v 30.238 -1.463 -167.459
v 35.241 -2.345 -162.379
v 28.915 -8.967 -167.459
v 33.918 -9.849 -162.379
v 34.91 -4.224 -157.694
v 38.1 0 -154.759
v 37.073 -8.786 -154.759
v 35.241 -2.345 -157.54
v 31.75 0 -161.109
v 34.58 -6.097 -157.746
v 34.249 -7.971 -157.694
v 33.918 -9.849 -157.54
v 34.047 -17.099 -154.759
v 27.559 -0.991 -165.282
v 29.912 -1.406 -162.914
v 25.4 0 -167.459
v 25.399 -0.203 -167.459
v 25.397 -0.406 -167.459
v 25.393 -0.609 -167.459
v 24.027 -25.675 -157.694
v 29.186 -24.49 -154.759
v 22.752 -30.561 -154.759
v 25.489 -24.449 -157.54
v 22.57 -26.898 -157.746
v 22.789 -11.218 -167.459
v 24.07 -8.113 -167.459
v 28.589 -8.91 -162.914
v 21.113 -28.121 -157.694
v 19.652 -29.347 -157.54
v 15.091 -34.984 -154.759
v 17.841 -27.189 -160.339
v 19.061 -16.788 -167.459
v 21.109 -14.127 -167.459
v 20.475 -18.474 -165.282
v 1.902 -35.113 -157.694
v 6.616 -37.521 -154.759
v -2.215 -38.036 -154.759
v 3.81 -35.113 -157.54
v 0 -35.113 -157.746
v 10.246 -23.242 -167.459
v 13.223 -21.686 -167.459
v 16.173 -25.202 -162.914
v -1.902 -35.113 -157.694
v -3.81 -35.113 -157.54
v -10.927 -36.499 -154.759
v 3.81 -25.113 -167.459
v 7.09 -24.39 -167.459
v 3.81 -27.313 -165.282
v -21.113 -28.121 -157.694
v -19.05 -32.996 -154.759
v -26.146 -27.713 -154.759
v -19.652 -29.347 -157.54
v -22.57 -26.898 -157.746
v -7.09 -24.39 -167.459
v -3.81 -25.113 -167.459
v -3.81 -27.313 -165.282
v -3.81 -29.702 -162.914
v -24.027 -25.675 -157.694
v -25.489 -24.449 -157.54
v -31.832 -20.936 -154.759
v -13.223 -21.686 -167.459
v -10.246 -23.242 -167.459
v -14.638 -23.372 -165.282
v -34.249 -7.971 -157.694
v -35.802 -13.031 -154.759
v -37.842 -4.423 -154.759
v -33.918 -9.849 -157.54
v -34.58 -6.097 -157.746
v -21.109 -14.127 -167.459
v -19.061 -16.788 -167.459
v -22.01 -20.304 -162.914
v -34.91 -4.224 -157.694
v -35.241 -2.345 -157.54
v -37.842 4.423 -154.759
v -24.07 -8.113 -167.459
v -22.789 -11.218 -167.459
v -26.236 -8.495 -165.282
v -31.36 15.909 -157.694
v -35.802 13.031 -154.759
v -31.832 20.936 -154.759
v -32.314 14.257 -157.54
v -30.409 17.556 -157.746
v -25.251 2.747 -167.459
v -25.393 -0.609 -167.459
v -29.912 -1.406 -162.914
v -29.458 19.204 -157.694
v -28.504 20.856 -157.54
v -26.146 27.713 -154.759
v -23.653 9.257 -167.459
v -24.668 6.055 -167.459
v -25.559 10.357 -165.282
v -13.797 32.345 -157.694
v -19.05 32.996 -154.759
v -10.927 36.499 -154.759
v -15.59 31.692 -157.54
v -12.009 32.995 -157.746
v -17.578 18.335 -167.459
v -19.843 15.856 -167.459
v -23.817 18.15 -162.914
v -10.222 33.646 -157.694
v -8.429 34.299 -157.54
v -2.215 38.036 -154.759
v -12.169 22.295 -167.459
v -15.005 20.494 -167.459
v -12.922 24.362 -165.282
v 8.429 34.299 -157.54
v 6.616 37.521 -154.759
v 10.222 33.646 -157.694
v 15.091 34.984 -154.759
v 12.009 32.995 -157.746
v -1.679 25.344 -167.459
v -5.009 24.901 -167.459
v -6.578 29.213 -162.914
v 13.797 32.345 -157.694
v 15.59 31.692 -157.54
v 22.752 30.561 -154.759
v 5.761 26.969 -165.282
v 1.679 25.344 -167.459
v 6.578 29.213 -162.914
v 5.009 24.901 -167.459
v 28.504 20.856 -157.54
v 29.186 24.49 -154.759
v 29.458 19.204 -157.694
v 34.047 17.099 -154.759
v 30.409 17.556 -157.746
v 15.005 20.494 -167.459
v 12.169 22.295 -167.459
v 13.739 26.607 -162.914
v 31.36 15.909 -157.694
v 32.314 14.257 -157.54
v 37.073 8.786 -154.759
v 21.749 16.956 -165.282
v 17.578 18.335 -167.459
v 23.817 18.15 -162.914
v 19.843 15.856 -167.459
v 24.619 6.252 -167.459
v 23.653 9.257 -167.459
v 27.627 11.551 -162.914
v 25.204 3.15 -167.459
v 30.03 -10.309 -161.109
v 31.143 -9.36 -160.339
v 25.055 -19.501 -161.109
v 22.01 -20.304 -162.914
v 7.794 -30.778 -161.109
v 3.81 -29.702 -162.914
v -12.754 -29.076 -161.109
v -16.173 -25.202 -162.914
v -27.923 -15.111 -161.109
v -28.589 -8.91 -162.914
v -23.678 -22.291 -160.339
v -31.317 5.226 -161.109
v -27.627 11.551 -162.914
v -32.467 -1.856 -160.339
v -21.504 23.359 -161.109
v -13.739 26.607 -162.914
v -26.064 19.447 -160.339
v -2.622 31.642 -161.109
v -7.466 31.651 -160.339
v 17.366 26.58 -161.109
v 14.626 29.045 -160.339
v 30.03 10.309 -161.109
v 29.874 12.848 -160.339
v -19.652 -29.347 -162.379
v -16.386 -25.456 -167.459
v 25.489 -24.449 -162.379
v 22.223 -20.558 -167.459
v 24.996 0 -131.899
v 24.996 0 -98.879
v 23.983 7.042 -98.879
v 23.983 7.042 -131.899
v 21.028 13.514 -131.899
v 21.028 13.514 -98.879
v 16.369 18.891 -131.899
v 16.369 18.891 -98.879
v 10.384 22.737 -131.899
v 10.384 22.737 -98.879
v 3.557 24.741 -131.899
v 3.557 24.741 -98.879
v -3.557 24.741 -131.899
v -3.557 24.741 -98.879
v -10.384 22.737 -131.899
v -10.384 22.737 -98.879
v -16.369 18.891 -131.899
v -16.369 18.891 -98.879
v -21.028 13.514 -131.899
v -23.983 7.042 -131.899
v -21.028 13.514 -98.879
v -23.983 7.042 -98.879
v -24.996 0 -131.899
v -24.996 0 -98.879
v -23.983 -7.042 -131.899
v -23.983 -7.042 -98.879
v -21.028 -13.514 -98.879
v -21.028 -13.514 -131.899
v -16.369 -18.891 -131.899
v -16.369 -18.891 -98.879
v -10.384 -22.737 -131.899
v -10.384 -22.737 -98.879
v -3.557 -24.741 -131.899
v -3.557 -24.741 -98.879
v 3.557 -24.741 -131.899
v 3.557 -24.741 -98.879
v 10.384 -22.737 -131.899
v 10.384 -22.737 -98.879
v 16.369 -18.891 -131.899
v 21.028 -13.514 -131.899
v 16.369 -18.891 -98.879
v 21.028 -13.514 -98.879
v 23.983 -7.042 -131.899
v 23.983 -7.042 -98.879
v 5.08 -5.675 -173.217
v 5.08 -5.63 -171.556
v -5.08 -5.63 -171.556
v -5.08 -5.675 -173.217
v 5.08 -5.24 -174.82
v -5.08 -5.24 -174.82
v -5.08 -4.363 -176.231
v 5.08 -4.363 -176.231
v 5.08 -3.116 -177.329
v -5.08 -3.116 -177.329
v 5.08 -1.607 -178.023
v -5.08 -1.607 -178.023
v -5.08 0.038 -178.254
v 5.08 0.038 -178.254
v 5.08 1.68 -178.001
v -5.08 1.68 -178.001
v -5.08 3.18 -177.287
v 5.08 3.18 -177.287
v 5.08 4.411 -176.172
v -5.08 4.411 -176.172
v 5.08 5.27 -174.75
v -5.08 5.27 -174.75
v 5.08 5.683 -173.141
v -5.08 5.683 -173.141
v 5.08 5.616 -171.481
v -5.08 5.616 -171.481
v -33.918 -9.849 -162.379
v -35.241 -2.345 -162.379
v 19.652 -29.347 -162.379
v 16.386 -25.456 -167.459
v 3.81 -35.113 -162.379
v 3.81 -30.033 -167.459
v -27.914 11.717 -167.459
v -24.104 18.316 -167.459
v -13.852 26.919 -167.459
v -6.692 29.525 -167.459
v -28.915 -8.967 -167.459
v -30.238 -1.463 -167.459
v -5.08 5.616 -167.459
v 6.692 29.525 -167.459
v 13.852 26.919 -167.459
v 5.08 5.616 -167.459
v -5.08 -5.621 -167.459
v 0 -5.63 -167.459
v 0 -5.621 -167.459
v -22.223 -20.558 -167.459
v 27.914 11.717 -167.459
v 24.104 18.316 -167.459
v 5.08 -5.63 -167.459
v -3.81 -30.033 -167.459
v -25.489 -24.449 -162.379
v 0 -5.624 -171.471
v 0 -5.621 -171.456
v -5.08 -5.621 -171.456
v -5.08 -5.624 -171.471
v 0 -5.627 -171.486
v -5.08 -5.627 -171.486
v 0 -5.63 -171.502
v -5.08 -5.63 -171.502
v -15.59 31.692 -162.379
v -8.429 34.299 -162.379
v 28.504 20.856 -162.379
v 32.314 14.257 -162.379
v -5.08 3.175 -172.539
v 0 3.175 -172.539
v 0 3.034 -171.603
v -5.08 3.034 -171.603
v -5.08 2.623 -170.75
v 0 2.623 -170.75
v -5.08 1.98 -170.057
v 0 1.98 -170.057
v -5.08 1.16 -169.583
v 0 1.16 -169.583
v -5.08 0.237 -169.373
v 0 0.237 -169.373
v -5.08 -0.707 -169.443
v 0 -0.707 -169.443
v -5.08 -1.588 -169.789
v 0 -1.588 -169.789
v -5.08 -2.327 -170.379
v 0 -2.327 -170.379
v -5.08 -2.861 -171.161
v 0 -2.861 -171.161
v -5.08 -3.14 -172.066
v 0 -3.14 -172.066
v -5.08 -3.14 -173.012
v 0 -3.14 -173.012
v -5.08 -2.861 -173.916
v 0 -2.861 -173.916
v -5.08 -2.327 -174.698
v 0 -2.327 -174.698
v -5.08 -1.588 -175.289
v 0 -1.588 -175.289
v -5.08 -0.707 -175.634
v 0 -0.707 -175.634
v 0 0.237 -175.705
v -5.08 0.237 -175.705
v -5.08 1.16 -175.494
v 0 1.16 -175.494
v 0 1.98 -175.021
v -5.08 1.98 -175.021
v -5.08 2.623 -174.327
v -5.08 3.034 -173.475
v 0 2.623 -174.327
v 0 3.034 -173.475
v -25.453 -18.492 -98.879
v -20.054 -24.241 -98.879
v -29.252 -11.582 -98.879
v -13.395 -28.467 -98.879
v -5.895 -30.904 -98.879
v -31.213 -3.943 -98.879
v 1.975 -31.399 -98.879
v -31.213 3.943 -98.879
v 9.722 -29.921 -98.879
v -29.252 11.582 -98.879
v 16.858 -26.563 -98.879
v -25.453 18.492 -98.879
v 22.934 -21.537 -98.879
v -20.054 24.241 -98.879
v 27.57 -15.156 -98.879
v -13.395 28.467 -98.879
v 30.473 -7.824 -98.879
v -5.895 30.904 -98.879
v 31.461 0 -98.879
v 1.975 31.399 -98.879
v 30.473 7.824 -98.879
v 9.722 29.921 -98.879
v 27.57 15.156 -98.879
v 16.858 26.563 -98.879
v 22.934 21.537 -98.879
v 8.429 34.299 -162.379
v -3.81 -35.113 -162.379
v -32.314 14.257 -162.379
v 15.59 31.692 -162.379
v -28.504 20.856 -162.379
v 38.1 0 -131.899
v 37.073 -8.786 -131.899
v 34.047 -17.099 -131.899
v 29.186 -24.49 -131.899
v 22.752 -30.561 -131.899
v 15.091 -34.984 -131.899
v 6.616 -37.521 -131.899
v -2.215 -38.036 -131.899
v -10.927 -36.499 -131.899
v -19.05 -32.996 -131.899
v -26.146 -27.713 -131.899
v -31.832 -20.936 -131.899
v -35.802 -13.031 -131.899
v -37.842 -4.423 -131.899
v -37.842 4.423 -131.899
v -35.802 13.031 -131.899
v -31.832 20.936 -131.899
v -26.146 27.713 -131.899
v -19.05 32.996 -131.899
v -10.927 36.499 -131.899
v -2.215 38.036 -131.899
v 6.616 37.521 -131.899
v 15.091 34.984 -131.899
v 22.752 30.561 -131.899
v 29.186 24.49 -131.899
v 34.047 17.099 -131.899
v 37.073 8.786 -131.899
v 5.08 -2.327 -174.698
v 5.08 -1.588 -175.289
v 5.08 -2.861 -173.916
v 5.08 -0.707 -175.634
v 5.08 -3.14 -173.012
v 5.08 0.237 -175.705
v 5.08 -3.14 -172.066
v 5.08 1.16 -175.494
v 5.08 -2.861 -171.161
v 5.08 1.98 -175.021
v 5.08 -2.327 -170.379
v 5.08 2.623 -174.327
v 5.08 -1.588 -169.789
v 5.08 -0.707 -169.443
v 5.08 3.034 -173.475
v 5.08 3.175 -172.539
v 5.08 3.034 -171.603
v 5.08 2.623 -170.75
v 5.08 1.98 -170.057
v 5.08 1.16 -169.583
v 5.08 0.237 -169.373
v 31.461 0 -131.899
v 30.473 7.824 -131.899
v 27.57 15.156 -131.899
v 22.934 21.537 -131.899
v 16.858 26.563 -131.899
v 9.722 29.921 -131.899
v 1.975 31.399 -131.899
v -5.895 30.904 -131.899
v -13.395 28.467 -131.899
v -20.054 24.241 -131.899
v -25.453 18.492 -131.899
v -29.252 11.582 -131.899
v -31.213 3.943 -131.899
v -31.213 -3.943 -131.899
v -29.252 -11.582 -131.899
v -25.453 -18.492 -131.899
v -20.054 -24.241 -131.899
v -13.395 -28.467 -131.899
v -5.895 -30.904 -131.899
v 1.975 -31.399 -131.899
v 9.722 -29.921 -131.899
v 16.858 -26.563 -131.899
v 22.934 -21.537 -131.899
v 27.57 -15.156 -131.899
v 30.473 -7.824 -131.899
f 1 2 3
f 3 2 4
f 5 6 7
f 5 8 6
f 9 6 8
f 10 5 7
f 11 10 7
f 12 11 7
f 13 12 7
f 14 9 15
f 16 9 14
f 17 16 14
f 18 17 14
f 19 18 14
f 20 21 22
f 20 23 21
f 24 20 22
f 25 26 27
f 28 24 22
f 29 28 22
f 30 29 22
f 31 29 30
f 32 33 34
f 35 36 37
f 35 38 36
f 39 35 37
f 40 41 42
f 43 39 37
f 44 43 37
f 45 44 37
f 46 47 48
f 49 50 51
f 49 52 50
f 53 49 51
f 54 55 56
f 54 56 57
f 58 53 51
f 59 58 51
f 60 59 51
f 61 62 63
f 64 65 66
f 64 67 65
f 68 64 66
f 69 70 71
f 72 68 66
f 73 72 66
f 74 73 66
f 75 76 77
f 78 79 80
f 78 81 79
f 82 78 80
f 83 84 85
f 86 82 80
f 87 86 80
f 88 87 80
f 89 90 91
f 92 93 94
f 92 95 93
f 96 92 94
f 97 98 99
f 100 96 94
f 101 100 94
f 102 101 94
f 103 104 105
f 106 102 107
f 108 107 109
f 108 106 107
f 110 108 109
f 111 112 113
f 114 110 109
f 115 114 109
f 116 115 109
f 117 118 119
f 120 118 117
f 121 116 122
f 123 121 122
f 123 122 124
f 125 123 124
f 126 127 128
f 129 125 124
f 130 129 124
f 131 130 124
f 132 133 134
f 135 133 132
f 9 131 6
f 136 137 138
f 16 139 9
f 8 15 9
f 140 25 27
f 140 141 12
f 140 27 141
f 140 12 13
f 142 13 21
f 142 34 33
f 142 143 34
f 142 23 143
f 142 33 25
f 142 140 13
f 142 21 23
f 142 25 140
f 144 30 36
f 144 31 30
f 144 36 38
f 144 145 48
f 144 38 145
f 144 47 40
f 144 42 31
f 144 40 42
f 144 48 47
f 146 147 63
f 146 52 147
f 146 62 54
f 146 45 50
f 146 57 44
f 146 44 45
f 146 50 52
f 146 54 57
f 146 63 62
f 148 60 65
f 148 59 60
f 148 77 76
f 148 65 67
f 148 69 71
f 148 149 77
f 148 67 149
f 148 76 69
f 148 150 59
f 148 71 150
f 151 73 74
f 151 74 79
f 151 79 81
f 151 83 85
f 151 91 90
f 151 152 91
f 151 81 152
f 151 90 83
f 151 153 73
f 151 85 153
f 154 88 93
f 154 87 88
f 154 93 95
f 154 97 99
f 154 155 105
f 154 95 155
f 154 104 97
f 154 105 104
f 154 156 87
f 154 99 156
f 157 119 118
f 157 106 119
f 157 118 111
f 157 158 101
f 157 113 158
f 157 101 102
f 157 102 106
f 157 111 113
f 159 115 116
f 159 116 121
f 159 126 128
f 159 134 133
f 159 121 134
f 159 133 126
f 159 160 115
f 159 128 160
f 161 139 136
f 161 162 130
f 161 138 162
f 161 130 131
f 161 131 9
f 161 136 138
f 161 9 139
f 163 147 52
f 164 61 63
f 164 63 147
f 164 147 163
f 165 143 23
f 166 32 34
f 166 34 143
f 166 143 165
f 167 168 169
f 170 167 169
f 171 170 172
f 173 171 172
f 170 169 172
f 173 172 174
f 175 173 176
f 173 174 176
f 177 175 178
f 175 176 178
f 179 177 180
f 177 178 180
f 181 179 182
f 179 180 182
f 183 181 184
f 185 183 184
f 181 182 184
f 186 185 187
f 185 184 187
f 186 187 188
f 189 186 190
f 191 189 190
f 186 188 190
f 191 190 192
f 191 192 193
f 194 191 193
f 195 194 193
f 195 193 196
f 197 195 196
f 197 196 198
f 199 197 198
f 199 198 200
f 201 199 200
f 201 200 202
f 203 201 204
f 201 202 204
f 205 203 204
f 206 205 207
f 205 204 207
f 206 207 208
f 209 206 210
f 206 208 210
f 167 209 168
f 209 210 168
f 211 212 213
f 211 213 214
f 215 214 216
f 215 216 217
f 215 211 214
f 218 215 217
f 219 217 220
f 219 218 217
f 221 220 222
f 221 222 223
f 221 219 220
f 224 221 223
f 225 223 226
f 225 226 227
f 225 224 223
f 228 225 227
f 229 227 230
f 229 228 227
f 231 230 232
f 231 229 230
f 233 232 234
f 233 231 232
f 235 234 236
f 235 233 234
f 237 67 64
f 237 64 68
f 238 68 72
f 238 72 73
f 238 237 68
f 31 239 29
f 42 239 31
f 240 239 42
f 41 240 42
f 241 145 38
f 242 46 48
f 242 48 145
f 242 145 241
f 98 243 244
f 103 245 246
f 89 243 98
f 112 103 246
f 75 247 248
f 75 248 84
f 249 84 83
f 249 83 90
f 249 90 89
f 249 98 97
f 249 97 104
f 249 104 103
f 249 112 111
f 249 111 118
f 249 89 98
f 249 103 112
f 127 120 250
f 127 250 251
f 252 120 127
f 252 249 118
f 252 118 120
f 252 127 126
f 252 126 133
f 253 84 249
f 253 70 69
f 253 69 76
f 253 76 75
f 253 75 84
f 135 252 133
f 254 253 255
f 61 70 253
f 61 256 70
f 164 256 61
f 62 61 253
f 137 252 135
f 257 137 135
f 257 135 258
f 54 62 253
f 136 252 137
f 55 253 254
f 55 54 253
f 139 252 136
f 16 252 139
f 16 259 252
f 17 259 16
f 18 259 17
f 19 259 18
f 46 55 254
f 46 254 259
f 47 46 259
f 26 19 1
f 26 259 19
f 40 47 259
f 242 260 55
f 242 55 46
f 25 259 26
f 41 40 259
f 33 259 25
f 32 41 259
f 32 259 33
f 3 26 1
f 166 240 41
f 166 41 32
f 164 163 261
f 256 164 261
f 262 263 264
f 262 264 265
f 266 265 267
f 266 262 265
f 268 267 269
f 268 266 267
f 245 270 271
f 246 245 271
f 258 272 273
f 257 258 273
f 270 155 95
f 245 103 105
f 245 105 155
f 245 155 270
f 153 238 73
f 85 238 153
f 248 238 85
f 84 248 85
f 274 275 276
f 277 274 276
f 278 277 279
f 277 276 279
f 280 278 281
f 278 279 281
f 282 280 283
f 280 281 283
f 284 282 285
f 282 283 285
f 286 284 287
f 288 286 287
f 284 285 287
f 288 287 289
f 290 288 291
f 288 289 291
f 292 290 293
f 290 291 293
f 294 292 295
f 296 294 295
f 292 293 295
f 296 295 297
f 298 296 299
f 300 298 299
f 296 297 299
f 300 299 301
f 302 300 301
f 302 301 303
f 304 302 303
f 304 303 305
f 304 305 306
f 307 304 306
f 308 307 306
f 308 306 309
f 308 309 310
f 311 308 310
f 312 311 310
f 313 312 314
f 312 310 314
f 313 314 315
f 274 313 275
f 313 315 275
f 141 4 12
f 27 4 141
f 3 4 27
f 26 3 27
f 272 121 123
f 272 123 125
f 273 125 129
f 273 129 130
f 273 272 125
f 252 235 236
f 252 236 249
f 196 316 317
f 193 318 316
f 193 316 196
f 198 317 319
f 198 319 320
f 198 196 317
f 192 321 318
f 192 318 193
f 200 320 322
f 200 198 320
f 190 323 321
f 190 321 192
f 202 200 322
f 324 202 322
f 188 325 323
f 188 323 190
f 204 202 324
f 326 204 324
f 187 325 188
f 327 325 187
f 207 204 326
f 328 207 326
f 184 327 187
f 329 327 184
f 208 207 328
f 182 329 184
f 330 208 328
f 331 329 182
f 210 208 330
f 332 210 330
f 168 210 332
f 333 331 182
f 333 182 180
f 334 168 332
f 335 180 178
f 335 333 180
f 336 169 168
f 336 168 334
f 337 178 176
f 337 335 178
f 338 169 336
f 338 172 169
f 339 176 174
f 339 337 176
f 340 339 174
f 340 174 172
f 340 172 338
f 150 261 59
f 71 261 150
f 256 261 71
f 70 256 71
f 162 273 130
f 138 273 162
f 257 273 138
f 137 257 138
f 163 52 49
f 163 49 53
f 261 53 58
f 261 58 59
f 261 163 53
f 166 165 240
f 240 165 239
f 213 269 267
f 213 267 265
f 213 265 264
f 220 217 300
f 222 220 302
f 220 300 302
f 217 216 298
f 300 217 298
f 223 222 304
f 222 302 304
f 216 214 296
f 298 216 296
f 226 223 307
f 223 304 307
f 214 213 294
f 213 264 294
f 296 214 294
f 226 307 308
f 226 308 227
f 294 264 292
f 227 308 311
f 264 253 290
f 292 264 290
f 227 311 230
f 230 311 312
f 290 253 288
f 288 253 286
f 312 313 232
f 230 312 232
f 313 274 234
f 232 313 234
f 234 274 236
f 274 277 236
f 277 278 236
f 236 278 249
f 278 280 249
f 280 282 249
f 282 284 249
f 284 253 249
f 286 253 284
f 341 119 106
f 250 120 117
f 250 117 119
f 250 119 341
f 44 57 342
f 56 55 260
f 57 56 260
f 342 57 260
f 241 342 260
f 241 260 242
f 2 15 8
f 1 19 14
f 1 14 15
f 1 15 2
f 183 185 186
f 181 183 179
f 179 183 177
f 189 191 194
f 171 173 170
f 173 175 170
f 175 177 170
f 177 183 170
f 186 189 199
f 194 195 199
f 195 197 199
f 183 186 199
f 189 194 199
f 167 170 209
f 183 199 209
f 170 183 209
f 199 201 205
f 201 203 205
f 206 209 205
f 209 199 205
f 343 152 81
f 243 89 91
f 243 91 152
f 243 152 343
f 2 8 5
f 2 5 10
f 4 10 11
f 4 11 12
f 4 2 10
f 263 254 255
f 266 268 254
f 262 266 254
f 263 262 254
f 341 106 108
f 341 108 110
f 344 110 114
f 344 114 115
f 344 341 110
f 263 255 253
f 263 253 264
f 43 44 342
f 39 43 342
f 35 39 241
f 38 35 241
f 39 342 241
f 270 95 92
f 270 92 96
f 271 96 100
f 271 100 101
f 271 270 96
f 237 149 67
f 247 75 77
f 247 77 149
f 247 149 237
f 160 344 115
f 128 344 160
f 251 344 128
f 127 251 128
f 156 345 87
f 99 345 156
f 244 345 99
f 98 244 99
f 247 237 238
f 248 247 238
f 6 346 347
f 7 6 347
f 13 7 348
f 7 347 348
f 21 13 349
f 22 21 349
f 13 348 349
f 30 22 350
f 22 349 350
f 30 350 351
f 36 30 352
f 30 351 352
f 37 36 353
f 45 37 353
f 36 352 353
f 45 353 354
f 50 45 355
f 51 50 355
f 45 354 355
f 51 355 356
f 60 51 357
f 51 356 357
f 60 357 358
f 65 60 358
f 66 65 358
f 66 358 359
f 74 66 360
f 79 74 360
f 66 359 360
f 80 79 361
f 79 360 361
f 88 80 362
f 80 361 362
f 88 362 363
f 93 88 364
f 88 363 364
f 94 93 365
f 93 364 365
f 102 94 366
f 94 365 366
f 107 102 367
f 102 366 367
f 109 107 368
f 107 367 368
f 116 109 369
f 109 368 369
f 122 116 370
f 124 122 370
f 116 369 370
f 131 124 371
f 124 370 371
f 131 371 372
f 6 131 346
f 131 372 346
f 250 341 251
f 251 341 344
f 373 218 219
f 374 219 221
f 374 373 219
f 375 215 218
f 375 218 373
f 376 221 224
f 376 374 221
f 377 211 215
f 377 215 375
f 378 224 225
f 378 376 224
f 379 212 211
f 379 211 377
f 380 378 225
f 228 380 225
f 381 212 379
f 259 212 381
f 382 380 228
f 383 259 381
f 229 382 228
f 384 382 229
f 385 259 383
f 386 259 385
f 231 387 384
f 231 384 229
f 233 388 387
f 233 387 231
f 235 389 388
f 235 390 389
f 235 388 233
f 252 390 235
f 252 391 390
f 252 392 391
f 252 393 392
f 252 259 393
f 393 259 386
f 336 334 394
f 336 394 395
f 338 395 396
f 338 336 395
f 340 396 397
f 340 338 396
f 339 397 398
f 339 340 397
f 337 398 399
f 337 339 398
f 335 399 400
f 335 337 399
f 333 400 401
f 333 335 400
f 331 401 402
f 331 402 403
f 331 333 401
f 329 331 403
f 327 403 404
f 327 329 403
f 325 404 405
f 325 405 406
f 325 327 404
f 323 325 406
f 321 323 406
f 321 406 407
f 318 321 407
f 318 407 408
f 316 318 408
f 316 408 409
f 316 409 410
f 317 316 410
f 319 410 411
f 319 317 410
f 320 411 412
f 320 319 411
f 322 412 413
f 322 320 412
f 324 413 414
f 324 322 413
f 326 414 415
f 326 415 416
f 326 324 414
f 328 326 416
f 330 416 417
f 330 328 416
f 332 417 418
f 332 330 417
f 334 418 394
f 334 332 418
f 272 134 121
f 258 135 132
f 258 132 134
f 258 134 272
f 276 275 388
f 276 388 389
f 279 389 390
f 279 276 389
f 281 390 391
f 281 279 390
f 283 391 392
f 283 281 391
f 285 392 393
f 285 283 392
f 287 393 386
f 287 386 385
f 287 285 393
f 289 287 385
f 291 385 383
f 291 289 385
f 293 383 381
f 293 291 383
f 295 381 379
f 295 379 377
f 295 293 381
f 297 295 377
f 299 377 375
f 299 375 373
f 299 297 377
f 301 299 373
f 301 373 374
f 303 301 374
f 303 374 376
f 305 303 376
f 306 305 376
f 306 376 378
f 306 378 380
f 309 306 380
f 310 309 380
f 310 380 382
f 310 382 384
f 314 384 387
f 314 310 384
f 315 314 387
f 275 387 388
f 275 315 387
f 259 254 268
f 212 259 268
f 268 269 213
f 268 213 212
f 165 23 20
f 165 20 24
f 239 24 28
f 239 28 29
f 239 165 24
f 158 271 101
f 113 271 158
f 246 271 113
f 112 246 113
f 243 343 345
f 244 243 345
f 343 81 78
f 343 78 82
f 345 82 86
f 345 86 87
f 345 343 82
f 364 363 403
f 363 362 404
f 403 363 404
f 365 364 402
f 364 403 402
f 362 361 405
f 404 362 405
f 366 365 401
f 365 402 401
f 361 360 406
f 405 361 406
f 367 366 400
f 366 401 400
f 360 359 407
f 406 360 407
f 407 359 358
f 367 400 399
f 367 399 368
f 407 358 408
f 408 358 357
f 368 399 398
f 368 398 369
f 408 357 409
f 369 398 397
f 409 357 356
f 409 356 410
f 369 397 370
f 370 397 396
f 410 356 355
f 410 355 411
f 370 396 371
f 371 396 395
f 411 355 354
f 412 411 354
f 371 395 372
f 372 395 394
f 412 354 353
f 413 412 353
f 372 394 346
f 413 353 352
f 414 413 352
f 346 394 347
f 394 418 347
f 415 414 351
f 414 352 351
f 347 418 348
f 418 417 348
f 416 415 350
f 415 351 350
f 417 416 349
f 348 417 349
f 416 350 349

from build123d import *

# Parameters (mm, degrees)
F2_R      = 31.4610783887
F2_R_2    = 24.995840748
F3_DEPTH  = 33.02
F4_R      = 38.1
F4_R_2    = 31.4610783887
F4_R_3    = 24.995840748
F5_DEPTH  = 35.56
F6_SIZE   = 12.7
F8_W      = 7.62
F8_H      = 11.43
F9_DEPTH  = 15.7618920784
F10_SIZE  = 5.08
F11_R     = 3.175
F12_DEPTH = 5.08
F13_R     = 3.175
F14_DEPTH = 5.08


with BuildPart() as f3:
    # F2 (on offset) → F3 (new body)
    with BuildSketch(Plane.XY.offset(-98.8788958639)):
        Circle(F2_R)
        Circle(F2_R_2, mode=Mode.SUBTRACT)
    extrude(amount=-F3_DEPTH)

    # F4 (on face) → F5 (join)
    with BuildSketch(Plane(origin=(0, 0, -131.8988958639), x_dir=(1, 0, 0), z_dir=(0, 0, -1))):
        Circle(F4_R)
        Circle(F4_R_2, mode=Mode.SUBTRACT)
        Circle(F4_R_2)
        Circle(F4_R_3, mode=Mode.SUBTRACT)
        Circle(F4_R_3)
    extrude(amount=F5_DEPTH)

    # F6
    f6_edges = [f3.edges().sort_by_distance(p)[0] for p in [
        (-38.1, 0, -167.458896),
    ]]
    chamfer(f6_edges, length=F6_SIZE)

    # F8 (on face) → F9 (join)
    with BuildSketch(Plane(origin=(0, 0, -167.4588958639), x_dir=(1, 0, 0), z_dir=(0, 0, -1))):
        with Locations((0, 29.3979875922)):
            Rectangle(F8_W, F8_H)
        Polygon((-12.3045016564, 20.5912418344), (-19.6515640351, 29.3471298192), (-25.4888226916, 24.4490882334), (-18.1417603129, 15.6932002486), align=None)
        Polygon((-22.6615902384, 7.8646251761), (-33.9179428553, 9.8494238468), (-35.2411419691, 2.3451887689), (-23.9847893522, 0.3603900981), align=None)
        Polygon((-22.4150688924, -8.5419370077), (-32.3137392576, -14.2569370077), (-28.5037392576, -20.8560505845), (-18.6050688924, -15.1410505845), align=None)
        Polygon((-11.6802876959, -20.9516319325), (-15.5895779341, -31.6923185881), (-8.4291201637, -34.2985120802), (-4.5198299255, -23.5578254246), align=None)
        Polygon((4.5198299255, -23.5578254246), (8.4291201637, -34.2985120802), (15.5895779341, -31.6923185881), (11.6802876959, -20.9516319325), align=None)
        Polygon((18.6050688924, -15.1410505845), (28.5037392576, -20.8560505845), (32.3137392576, -14.2569370077), (22.4150688924, -8.5419370077), align=None)
        Polygon((23.9847893522, 0.3603900981), (35.2411419691, 2.3451887689), (33.9179428553, 9.8494238468), (22.6615902384, 7.8646251761), align=None)
        Polygon((18.1417603129, 15.6932002486), (25.4888226916, 24.4490882334), (19.6515640351, 29.3471298192), (12.3045016564, 20.5912418344), align=None)
    extrude(amount=-F9_DEPTH)

    # F10
    f10_edges = [f3.edges().sort_by_distance(p)[0] for p in [
        (-34.579542, -6.097306, -167.458896),
        (-22.570193, -26.898109, -167.458896),
        (0, -35.112988, -167.458896),
        (22.570193, -26.898109, -167.458896),
        (34.579542, -6.097306, -167.458896),
        (30.408739, 17.556494, -167.458896),
        (12.009349, 32.995415, -167.458896),
        (-12.009349, 32.995415, -167.458896),
        (-30.408739, 17.556494, -167.458896),
    ]]
    chamfer(f10_edges, length=F10_SIZE)

    # F11 (on Right) → F12 (join)
    with BuildSketch(Plane.YZ):
        with BuildLine():
            Line((-5.6298612599, -163.2592975991), (-5.6298612599, -171.5561002624))
            ThreePointArc((-5.6298612599, -171.5561002624), (0.0380569816, -178.2537691491), (5.6162731016, -171.4812090256))
            Line((5.6162731016, -171.4812090256), (5.6162731016, -163.2592975991))
            Line((5.6162731016, -163.2592975991), (-5.6298612599, -163.2592975991))
        make_face()
        with Locations((0, -172.5388958639)):
            Circle(F11_R, mode=Mode.SUBTRACT)
    extrude(amount=F12_DEPTH)

    # F13 (on face) → F14 (join)
    with BuildSketch(Plane.YZ):
        with BuildLine():
            Line((-5.6212010458, -163.5551446258), (-5.6212010458, -171.4558557956))
            ThreePointArc((-5.6212010458, -171.4558557956), (-5.6255780847, -171.4788259602), (-5.6298612599, -171.5018138123))
            Line((-5.6298612599, -171.5018138123), (-5.6298612599, -171.5561002624))
            ThreePointArc((-5.6298612599, -171.5561002624), (0.0380569816, -178.2537691491), (5.6162731016, -171.4812090256))
            Line((5.6162731016, -171.4812090256), (5.6162731016, -163.5551446258))
            Line((5.6162731016, -163.5551446258), (-5.6212010458, -163.5551446258))
        make_face()
        with Locations((0, -172.5388958639)):
            Circle(F13_R, mode=Mode.SUBTRACT)
    extrude(amount=-F14_DEPTH)


solid = f3.part
